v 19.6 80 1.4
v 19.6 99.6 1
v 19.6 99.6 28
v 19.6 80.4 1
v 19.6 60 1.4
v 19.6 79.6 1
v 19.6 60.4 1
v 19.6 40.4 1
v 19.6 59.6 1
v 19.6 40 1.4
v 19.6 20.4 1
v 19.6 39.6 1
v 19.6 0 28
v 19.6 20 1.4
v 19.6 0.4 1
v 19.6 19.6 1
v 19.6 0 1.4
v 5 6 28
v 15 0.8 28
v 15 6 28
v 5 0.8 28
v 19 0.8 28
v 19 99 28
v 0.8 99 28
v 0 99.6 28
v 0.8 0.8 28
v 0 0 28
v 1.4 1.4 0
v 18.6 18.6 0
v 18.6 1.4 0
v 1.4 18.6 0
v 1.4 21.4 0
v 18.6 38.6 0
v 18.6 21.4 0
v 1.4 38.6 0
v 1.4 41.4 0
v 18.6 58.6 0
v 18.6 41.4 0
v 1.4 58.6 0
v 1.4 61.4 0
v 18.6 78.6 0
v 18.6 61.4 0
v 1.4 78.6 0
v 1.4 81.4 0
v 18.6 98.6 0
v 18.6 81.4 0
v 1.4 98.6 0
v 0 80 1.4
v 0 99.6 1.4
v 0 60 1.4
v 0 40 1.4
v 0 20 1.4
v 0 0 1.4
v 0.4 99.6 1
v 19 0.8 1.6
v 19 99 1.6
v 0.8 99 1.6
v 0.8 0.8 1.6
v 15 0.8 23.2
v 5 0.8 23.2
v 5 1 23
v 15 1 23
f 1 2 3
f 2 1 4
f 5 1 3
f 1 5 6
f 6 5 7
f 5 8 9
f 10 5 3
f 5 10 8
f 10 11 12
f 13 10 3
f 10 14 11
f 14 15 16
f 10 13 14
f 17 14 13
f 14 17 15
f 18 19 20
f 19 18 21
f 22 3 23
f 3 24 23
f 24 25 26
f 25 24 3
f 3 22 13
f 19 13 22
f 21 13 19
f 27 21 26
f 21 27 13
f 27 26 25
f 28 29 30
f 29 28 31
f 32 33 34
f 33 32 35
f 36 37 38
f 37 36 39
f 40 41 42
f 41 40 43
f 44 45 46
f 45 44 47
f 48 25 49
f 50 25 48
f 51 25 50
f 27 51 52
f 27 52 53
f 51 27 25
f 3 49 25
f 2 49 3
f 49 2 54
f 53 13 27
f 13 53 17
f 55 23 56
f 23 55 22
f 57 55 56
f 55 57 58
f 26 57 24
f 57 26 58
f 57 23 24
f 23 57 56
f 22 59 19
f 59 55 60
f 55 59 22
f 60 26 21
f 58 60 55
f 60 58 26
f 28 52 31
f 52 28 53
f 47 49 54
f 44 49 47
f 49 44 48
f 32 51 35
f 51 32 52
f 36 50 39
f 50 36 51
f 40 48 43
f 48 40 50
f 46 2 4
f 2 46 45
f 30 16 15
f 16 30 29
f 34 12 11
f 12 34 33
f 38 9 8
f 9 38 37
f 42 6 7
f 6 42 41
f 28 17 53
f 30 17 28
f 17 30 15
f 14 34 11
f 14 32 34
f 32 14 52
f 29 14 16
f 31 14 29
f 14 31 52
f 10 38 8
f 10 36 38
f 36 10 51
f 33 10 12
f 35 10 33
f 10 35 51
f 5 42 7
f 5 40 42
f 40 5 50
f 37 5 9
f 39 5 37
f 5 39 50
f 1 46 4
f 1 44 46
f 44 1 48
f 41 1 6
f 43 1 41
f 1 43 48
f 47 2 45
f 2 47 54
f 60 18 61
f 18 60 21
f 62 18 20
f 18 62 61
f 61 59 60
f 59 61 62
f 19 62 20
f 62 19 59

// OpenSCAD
$fa=4; // default minimum facet angle is now 0.5
$fs=0.05; // default minimum facet size is now 0.05 mm

tolerance = .2;
unit = 20;
wallThickness = .8;

wallHeight = 28;

handleHeight = 5;

xUnits = 1;
yUnits = 5;

union() {
  difference() {
    // Body
    difference() {
      cube([tol(xUnits * unit, 2), tol(yUnits * unit, 2), wallHeight]);
      translate([wallThickness, wallThickness, wallThickness * 2]) cube([tol(xUnits * unit - wallThickness * 2, 1), tol(yUnits * unit - wallThickness * 2, 1), wallHeight]);
    }

    // Grid
    for (i = [0:xUnits]) {
      translate([i * unit - tol(wallThickness, -3), 0, 0]) polyhedron(points = [
        [0, 0, 0],
        [tol(wallThickness, -3) * 2, 0, 0],
        [tol(wallThickness, -3), 0, tol(wallThickness, -3)],
        [0, yUnits * unit, 0],
        [tol(wallThickness, -3) * 2, yUnits * unit, 0],
        [tol(wallThickness, -3), yUnits * unit, tol(wallThickness, -3)]
        ], faces = [
          [0, 2, 1],
          [5, 3, 4],
          [2, 5, 4, 1],
          [0, 3, 5, 2],
          [1, 4, 3, 0]
        ], convexity = 10);
    }

    for (j = [0:yUnits]) {
      translate([0, j * unit - tol(wallThickness, -3), 0]) polyhedron(points = [
        [0, 0, 0],
        [0, tol(wallThickness, -3) * 2, 0],
        [0, tol(wallThickness, -3), tol(wallThickness, -3)],
        [xUnits * unit, 0, 0],
        [xUnits * unit, tol(wallThickness, -3) * 2, 0],
        [xUnits * unit, tol(wallThickness, -3), tol(wallThickness, -3)]
        ], faces = [
          [0, 2, 1],
          [5, 3, 4],
          [2, 5, 4, 1],
          [0, 3, 5, 2],
          [1, 4, 3, 0]
        ], convexity = 10);
    }
  }

  // Handle
  translate([0, tol(wallThickness, -1), 0]) difference() {
    translate([(xUnits * unit / 2) - (unit / 4), 0, (wallHeight) - handleHeight]) rotate([45, 0, 0]) cube([unit / 2, handleHeight * 2, handleHeight * 2]);
    translate([-wallThickness, -wallThickness - 1000, -500]) cube([(xUnits * unit) + (2 * wallThickness), 1000, 1000]);
    translate([-100, -100, -1000]) cube([1000, 1000, 1000]);
    translate([-100, -100, wallHeight]) cube([1000, 1000, 1000]);
  }
}


function tol(value, m = 1) = value - (m * tolerance);
